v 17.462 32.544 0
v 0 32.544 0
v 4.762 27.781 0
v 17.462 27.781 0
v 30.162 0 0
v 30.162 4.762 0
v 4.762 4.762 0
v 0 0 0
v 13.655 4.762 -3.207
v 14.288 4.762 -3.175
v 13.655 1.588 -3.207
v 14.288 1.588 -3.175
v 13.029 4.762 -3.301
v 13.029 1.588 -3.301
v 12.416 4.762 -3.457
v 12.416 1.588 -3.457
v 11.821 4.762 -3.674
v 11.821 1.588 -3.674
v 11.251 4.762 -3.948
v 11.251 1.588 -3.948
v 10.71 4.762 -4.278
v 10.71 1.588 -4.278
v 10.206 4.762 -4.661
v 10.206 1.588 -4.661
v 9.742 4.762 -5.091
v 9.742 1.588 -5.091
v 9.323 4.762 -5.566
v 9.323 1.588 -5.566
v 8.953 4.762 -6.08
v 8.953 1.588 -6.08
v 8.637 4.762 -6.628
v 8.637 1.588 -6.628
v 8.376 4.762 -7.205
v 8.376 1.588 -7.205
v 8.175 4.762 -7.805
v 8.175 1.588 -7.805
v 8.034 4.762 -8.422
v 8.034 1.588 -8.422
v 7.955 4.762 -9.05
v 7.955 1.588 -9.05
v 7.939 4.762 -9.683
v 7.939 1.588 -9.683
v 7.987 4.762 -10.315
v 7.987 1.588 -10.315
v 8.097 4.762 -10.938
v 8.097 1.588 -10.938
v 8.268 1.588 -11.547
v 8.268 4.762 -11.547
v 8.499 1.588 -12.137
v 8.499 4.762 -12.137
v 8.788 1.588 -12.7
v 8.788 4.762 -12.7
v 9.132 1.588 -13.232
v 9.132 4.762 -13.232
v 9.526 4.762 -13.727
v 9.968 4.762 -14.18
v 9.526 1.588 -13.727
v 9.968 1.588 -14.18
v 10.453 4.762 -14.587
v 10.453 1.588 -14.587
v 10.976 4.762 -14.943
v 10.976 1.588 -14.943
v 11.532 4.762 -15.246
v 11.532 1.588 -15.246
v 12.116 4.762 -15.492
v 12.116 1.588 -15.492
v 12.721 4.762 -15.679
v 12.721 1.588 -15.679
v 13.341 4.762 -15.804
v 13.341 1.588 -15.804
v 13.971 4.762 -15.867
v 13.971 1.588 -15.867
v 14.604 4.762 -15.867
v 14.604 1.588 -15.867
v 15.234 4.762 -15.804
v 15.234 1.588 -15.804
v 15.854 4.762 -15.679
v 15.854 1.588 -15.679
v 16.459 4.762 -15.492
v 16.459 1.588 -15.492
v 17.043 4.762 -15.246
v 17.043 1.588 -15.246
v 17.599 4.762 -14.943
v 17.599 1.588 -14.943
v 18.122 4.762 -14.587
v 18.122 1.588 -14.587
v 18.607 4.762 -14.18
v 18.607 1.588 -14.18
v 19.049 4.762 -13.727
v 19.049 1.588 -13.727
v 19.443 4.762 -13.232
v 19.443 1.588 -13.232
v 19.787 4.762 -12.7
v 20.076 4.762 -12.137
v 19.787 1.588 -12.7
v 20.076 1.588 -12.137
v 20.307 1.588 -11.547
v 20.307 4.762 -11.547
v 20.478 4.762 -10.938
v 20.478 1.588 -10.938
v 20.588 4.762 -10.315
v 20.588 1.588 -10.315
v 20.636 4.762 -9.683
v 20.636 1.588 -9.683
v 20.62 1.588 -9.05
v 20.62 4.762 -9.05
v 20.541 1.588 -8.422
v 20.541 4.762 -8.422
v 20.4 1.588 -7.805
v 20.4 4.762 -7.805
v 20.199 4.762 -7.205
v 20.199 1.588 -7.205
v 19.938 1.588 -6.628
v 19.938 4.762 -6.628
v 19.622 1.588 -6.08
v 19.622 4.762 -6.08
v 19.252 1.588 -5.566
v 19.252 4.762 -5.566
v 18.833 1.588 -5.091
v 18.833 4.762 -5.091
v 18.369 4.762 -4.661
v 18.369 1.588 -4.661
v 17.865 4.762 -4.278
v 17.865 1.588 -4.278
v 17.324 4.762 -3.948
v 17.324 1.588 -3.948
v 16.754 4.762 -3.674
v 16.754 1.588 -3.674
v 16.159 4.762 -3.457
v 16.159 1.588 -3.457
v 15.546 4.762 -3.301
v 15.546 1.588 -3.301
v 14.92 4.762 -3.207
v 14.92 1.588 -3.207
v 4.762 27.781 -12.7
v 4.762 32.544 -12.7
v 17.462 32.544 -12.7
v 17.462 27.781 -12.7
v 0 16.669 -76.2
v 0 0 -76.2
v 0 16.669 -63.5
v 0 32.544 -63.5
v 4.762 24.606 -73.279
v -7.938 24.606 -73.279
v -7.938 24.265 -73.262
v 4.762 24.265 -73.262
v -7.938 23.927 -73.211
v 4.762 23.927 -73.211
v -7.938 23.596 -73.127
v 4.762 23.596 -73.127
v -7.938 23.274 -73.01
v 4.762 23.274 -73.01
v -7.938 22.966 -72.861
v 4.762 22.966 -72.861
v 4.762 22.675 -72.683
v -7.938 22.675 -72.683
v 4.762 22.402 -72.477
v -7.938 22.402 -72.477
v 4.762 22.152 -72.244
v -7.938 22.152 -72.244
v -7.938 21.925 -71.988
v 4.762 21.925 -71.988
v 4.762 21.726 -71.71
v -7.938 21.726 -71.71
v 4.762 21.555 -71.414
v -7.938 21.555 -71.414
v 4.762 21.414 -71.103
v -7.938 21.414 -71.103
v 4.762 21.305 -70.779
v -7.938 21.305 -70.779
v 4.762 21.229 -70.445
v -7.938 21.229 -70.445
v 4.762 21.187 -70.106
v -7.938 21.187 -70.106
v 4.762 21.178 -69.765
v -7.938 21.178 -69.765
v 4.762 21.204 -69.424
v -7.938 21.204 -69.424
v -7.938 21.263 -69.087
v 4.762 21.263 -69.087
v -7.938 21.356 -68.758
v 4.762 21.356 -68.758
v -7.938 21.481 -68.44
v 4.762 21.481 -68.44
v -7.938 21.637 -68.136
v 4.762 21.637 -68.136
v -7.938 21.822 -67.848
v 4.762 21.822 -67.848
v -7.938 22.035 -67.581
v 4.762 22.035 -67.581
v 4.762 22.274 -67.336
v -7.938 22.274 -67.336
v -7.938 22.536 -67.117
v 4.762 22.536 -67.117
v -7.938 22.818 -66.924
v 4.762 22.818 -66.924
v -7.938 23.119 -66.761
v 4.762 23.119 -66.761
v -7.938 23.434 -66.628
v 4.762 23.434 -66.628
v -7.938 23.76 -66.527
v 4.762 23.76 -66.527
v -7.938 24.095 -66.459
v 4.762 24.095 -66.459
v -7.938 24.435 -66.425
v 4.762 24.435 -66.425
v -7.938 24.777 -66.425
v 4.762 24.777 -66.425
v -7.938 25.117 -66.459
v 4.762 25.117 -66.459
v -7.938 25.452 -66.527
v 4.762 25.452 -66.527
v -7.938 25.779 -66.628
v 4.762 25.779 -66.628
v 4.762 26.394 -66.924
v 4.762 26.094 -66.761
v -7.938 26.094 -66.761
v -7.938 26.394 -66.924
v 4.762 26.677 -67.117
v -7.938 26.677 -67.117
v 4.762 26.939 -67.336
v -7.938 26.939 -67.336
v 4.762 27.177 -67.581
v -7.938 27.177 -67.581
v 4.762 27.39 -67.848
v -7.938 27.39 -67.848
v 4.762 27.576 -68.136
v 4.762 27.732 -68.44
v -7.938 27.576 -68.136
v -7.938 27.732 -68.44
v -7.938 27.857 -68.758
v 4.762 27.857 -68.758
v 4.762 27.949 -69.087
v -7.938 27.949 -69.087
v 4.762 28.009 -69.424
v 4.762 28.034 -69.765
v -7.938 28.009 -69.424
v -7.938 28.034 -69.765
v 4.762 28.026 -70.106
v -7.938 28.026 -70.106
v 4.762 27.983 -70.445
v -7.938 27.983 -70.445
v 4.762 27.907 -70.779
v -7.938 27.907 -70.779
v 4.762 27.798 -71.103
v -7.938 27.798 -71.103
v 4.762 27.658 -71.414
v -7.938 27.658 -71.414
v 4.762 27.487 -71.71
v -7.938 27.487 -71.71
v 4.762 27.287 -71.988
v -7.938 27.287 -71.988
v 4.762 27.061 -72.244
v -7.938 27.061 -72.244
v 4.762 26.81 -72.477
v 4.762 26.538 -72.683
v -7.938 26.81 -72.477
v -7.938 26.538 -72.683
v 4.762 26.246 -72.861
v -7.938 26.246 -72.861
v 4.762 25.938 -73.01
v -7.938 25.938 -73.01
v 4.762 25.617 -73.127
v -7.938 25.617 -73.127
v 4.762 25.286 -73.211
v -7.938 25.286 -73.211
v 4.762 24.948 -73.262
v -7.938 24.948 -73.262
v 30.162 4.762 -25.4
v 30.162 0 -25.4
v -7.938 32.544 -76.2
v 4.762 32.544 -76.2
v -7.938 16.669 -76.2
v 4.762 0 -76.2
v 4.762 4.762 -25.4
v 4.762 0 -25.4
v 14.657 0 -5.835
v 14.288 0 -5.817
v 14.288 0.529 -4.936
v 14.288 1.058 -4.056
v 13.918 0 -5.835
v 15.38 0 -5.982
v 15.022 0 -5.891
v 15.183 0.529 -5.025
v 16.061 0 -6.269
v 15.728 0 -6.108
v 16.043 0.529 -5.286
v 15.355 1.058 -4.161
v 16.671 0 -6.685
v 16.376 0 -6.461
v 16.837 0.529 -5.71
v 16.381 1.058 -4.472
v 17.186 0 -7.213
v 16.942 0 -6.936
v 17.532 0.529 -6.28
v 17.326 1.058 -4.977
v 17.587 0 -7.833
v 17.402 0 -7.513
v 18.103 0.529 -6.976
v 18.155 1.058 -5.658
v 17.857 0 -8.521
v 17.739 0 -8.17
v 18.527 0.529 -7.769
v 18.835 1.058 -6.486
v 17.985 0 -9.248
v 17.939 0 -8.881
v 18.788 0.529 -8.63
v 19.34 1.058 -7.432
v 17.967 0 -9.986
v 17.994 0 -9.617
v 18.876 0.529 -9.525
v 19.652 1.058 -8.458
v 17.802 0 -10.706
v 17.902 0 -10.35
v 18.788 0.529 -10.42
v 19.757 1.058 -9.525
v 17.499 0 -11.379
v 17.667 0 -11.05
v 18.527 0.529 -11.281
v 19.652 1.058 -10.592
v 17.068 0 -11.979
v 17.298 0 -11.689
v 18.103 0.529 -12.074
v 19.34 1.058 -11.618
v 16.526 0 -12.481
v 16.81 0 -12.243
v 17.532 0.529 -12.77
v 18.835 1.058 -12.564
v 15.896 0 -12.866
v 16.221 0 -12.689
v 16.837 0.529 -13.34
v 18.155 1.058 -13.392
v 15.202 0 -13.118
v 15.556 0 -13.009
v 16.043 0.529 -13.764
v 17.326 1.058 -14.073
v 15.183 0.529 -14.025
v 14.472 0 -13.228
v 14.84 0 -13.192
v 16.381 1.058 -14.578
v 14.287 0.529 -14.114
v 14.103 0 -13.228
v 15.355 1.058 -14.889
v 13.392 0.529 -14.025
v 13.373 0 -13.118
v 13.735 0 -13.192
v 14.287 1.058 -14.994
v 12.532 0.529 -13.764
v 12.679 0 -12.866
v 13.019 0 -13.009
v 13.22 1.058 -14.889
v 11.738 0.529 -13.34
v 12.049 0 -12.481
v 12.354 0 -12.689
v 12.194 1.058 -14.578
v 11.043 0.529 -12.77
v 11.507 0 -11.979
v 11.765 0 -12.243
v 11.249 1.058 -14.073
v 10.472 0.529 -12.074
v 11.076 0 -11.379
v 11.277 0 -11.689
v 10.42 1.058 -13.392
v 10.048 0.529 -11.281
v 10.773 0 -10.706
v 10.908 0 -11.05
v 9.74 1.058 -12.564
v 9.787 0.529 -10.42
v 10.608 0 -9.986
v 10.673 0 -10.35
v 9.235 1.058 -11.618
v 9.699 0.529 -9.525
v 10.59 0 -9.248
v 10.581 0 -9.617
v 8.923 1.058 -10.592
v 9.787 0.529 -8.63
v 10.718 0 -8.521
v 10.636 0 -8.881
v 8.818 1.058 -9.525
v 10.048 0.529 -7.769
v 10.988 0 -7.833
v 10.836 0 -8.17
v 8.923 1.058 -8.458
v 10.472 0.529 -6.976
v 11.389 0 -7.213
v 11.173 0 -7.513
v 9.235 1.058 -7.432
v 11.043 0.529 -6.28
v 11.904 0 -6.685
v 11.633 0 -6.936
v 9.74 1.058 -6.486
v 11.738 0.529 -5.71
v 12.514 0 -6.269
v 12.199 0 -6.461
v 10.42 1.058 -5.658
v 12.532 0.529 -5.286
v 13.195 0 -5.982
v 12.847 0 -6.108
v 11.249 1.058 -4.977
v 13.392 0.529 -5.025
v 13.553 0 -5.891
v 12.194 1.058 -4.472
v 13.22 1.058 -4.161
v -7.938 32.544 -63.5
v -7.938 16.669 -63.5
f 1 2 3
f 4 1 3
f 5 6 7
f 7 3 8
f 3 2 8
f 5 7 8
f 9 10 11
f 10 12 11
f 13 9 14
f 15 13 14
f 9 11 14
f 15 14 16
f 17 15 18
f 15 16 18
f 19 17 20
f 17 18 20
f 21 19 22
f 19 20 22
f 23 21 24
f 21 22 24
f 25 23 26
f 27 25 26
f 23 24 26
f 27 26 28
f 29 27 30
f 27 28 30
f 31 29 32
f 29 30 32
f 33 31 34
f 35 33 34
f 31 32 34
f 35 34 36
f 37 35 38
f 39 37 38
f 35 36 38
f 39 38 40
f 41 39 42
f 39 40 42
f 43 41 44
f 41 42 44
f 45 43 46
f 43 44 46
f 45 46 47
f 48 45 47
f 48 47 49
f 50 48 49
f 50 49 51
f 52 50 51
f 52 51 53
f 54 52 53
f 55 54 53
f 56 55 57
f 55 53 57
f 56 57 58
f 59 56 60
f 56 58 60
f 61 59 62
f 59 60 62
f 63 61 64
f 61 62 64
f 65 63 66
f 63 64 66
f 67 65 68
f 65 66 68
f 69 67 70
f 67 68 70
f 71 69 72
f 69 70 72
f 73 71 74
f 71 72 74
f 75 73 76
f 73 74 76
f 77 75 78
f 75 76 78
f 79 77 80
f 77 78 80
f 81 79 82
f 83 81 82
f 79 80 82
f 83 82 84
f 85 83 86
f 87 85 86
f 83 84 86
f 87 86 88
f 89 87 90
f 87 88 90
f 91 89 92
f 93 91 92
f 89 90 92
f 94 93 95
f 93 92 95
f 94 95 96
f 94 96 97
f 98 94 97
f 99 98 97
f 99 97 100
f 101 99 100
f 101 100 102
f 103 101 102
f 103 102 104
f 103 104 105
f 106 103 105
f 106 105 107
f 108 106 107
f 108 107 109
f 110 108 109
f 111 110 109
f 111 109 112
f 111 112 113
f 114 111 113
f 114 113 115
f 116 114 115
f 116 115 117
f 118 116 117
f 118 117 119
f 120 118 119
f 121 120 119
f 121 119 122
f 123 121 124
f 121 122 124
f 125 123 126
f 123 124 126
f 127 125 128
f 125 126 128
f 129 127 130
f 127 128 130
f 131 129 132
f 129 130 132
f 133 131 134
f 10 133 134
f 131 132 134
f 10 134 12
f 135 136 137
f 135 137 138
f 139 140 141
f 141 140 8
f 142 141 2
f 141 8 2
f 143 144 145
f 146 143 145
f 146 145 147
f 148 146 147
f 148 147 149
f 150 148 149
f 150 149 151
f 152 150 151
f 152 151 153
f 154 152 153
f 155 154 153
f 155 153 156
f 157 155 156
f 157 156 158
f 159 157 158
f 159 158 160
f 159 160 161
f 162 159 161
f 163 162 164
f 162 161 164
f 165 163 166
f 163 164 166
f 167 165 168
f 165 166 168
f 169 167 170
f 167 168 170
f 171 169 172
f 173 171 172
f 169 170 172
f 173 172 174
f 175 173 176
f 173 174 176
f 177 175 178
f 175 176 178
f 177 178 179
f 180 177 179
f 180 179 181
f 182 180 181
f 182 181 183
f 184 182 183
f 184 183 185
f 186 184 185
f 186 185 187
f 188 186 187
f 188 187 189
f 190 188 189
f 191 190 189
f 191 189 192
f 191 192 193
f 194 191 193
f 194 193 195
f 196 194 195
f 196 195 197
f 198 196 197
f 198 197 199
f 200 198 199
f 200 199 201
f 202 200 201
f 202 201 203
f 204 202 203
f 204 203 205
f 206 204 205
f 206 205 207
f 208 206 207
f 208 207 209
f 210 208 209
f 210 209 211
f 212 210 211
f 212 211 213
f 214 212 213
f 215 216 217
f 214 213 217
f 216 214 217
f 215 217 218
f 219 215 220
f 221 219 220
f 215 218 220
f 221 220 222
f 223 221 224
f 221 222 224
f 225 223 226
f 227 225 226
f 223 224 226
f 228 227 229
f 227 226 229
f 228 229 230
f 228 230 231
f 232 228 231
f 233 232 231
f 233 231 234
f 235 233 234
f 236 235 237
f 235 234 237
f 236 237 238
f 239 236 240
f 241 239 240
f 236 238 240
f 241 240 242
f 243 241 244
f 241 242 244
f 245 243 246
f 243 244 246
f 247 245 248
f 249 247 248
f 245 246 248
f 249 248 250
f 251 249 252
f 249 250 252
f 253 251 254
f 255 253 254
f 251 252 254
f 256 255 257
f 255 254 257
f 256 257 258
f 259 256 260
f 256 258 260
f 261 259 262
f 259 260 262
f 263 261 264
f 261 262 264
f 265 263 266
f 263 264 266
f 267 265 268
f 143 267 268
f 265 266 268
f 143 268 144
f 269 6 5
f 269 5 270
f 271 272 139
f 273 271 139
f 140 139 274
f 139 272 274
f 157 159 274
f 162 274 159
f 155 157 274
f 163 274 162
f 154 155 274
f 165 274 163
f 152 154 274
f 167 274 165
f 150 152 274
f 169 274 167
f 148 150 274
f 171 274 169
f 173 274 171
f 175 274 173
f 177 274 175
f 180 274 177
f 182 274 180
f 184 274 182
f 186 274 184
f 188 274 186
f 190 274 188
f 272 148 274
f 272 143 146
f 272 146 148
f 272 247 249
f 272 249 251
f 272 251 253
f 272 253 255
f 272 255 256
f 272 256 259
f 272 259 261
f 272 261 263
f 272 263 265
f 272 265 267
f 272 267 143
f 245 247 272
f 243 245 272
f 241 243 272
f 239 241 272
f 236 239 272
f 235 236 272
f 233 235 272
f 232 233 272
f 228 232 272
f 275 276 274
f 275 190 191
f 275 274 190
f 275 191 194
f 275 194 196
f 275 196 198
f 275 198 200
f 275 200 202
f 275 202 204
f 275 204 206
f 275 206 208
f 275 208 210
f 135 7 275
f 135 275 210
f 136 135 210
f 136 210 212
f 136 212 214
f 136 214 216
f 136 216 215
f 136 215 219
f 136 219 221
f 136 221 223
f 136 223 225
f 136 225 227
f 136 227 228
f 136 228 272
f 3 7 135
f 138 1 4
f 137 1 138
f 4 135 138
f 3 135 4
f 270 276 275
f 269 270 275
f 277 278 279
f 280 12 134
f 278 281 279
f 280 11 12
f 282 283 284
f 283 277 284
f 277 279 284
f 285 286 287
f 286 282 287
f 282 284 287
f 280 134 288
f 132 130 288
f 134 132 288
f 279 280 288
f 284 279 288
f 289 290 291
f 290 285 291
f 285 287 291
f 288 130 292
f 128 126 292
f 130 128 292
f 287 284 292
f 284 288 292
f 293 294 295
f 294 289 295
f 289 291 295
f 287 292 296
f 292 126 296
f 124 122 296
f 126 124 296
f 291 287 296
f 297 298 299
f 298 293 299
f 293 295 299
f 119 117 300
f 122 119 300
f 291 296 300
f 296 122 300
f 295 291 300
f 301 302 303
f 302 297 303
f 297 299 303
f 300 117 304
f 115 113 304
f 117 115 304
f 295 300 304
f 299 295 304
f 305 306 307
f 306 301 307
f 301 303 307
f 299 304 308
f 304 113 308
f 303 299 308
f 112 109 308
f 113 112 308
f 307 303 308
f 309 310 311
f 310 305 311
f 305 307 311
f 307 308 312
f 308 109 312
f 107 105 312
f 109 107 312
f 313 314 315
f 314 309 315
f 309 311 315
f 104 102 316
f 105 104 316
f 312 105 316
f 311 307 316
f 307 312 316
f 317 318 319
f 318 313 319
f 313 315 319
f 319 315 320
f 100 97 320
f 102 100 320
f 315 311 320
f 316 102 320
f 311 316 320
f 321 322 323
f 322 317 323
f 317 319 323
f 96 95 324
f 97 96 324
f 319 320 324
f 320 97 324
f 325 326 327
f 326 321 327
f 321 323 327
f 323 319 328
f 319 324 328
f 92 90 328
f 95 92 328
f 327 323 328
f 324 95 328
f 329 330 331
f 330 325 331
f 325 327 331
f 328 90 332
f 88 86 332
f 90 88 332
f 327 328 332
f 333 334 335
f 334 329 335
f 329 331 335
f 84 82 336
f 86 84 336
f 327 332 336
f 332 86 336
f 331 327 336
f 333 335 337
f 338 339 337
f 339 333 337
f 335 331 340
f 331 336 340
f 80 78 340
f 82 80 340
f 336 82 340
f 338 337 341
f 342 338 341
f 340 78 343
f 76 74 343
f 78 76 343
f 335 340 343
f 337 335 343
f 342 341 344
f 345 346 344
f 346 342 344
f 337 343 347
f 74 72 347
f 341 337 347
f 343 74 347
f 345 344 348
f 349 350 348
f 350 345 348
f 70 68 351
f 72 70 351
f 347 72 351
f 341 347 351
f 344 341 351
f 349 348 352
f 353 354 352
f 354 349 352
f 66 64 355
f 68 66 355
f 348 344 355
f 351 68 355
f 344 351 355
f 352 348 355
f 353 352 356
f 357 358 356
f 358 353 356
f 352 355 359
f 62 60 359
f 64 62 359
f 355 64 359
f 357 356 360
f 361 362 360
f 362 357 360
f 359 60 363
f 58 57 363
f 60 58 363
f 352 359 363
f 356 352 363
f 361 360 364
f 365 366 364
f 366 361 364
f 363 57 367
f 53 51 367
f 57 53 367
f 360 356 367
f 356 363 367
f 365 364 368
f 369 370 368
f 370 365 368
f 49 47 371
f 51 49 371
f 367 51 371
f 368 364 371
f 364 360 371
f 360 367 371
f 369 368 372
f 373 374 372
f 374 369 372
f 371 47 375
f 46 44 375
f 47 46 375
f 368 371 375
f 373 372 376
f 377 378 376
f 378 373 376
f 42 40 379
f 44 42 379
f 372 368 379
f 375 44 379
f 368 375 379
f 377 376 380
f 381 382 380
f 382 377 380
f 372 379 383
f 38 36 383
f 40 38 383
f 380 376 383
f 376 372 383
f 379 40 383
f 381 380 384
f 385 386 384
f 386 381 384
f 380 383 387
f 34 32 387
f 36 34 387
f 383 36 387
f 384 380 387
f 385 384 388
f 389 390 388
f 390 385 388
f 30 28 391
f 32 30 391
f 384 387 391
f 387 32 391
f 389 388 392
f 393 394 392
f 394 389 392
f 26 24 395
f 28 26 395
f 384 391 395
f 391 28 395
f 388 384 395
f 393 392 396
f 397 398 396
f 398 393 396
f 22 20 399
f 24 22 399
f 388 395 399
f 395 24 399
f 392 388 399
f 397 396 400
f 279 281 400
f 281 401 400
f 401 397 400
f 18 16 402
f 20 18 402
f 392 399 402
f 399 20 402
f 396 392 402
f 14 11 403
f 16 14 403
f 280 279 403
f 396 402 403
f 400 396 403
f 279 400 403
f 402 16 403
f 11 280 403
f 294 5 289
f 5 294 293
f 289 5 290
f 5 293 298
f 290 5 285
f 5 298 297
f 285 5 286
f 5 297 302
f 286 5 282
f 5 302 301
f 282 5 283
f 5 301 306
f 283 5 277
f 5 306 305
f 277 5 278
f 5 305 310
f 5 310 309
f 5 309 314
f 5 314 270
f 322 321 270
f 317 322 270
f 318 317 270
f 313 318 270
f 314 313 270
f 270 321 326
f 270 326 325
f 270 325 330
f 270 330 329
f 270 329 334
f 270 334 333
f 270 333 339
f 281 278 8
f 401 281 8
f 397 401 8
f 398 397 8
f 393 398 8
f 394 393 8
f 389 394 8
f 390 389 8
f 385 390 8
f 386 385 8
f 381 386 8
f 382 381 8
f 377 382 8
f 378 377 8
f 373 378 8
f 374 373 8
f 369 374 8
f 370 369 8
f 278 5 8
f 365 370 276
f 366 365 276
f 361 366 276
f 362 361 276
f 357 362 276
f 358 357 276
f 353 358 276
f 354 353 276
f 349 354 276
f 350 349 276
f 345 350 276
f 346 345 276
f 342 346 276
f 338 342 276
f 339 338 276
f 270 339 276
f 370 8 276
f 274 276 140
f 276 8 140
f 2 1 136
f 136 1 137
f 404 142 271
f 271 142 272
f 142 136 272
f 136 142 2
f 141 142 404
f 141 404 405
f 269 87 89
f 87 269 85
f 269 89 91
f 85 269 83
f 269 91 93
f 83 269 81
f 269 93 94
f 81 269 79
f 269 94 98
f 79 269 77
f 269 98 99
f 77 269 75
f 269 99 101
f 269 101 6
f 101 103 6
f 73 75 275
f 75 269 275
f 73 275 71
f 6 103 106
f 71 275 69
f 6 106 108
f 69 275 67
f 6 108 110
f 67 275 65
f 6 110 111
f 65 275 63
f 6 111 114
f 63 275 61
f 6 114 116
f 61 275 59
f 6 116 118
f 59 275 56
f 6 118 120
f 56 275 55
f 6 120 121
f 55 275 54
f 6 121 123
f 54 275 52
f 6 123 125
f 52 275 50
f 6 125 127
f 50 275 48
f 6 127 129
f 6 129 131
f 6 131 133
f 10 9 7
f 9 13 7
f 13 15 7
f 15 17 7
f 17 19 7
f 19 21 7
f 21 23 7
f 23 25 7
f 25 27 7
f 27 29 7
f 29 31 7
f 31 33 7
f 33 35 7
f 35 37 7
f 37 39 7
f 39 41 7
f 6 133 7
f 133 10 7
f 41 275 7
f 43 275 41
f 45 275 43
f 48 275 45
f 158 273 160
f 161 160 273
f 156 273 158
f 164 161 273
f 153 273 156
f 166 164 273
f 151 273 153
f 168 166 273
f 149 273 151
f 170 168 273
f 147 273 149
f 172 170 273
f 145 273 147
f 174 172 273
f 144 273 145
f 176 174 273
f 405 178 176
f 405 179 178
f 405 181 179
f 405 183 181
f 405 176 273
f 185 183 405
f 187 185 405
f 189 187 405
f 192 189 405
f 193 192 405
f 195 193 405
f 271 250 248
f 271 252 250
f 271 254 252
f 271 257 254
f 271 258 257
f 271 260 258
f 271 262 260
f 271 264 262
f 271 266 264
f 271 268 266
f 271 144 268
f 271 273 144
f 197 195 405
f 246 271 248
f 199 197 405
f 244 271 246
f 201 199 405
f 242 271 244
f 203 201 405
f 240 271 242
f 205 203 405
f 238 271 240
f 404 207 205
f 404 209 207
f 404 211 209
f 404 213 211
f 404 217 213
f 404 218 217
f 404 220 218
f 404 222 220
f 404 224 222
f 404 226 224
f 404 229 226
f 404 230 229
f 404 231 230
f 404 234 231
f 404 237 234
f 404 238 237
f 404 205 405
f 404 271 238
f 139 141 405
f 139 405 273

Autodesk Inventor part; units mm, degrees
ref_plane "YZ Plane" through (0, 0, 0) normal (1, 0, 0) x (0, 1, 0)
ref_plane "XZ Plane" through (0, 0, 0) normal (0, 1, 0) x (-1, 0, 0)
ref_plane "XY Plane" through (0, 0, 0) normal (0, 0, 1) x (1, 0, 0)
sketch "Sketch1" plane through (0, 0, 0) normal (1, 0, 0) x (0, 1, 0)
  line L0 (0, 0) -> (32.5438, 0)
  line L1 (32.5438, 0) -> (32.5438, -76.2)
  line L2 (32.5438, -76.2) -> (0, -76.2)
  line L3 (0, -76.2) -> (0, 0)
  dimension "d0" = 32.5438
  dimension "d1" = 76.2
extrude "Extrusion1" add sketch "Sketch1" along normal blind 4.7625
sketch "Sketch2" plane through (4.7625, 0, 0) normal (1, 0, 0) x (0, 0, -1)
  line L0 (0, 32.5438) -> (0, 0) projected
  line L1 (0, 0) -> (76.2, 0) projected
  line L2 (76.2, 0) -> (76.2, 32.5438) projected
  line L3 (76.2, 32.5438) -> (0, 32.5438) projected
  line L4 (0, 32.5438) -> (12.7, 32.5438)
  line L5 (12.7, 32.5438) -> (12.7, 27.7812)
  line L6 (12.7, 27.7812) -> (0, 27.7812)
  line L7 (0, 27.7812) -> (0, 32.5438)
  dimension "d4" = 12.7
  dimension "d5" = 4.7625
extrude "Extrusion2" add sketch "Sketch2" along normal blind 12.7 contours L3 L5 L6 L0
sketch "Sketch3" plane through (4.7625, 0, 0) normal (1, 0, 0) x (0, 0, -1)
  line L0 (12.7, 27.7812) -> (0, 27.7812) projected
  line L1 (0, 27.7812) -> (0, 0) projected
  line L2 (0, 0) -> (76.2, 0) projected
  line L3 (76.2, 0) -> (76.2, 32.5438) projected
  line L4 (76.2, 32.5438) -> (12.7, 32.5438) projected
  line L5 (12.7, 32.5438) -> (12.7, 27.7812) projected
  line L6 (0, 0) -> (25.4, 0)
  line L7 (25.4, 0) -> (25.4, 4.7625)
  line L8 (25.4, 4.7625) -> (0, 4.7625)
  line L9 (0, 4.7625) -> (0, 0)
  dimension "d8" = 4.7625
extrude "Extrusion3" add sketch "Sketch3" along normal blind 25.4 contours L8 L7 L2 L1
sketch "Sketch4" plane through (0, 0, 0) normal (-1, 0, 0) x (0, 0, 1)
  line L0 (0, 0) -> (0, 32.5438) projected
  line L1 (0, 32.5438) -> (-76.2, 32.5438) projected
  line L2 (-76.2, 32.5438) -> (-76.2, 0) projected
  line L3 (-76.2, 0) -> (0, 0) projected
  line L4 (-76.2, 32.5438) -> (-12.7, 32.5438) projected
  line L5 (-76.2, 32.5438) -> (-63.5, 32.5438)
  line L6 (-63.5, 32.5438) -> (-63.5, 16.6688)
  line L7 (-63.5, 16.6688) -> (-76.2, 16.6688)
  line L8 (-76.2, 16.6688) -> (-76.2, 32.5438)
  dimension "d11" = 12.7
  dimension "d12" = 15.875
extrude "Extrusion4" add sketch "Sketch4" along normal blind 7.9375 contours L2 L1 L6 L7
sketch "Sketch5" plane through (4.7625, 0, 0) normal (1, 0, 0) x (0, 0, -1)
  line L0 (25.4, 4.7625) -> (25.4, 0) projected
  line L1 (25.4, 0) -> (76.2, 0) projected
  line L2 (76.2, 0) -> (76.2, 32.5438) projected
  line L3 (76.2, 32.5438) -> (12.7, 32.5438) projected
  line L4 (12.7, 32.5438) -> (12.7, 27.7812) projected
  line L5 (12.7, 27.7812) -> (0, 27.7812) projected
  line L6 (0, 27.7812) -> (0, 4.7625) projected
  line L7 (0, 4.7625) -> (25.4, 4.7625) projected
  line L8 (0, 32.5438) -> (0, 27.7812) projected
  line L9 (0, 27.7812) -> (12.7, 27.7812) projected
  line L10 (12.7, 27.7812) -> (12.7, 32.5438) projected
  line L11 (12.7, 32.5438) -> (0, 32.5438) projected
  point P0 (0, 0)
  point P1 (69.85, 24.6063)
  dimension "d15" = 4.7625
  dimension "d16" = 7.9375
  dimension "d17" = 6.35
hole "Hole1" at (4.7625, 24.6063, -69.85) direction (-1, 0, 0) diameter 6.858 end through all
sketch "Sketch6" plane through (4.7625, 4.7625, 0) normal (0, 1, 0) x (1, 0, 0)
  line L0 (0, 0) -> (0, 25.4) projected
  line L1 (0, 0) -> (25.4, 0) projected
  line L2 (25.4, 25.4) -> (25.4, 0) projected
  line L3 (0, 25.4) -> (25.4, 25.4) projected
  point P0 (-4.7625, 0)
  point P1 (9.525, 9.525)
  dimension "d25" = 9.525
  dimension "d26" = 9.525
hole "Hole2" at (14.2875, 4.7625, -9.525) direction (0, -1, 0) diameter 12.7 depth 3.175 tip angle 118
properties part number "WheelIntake4.0Base"
